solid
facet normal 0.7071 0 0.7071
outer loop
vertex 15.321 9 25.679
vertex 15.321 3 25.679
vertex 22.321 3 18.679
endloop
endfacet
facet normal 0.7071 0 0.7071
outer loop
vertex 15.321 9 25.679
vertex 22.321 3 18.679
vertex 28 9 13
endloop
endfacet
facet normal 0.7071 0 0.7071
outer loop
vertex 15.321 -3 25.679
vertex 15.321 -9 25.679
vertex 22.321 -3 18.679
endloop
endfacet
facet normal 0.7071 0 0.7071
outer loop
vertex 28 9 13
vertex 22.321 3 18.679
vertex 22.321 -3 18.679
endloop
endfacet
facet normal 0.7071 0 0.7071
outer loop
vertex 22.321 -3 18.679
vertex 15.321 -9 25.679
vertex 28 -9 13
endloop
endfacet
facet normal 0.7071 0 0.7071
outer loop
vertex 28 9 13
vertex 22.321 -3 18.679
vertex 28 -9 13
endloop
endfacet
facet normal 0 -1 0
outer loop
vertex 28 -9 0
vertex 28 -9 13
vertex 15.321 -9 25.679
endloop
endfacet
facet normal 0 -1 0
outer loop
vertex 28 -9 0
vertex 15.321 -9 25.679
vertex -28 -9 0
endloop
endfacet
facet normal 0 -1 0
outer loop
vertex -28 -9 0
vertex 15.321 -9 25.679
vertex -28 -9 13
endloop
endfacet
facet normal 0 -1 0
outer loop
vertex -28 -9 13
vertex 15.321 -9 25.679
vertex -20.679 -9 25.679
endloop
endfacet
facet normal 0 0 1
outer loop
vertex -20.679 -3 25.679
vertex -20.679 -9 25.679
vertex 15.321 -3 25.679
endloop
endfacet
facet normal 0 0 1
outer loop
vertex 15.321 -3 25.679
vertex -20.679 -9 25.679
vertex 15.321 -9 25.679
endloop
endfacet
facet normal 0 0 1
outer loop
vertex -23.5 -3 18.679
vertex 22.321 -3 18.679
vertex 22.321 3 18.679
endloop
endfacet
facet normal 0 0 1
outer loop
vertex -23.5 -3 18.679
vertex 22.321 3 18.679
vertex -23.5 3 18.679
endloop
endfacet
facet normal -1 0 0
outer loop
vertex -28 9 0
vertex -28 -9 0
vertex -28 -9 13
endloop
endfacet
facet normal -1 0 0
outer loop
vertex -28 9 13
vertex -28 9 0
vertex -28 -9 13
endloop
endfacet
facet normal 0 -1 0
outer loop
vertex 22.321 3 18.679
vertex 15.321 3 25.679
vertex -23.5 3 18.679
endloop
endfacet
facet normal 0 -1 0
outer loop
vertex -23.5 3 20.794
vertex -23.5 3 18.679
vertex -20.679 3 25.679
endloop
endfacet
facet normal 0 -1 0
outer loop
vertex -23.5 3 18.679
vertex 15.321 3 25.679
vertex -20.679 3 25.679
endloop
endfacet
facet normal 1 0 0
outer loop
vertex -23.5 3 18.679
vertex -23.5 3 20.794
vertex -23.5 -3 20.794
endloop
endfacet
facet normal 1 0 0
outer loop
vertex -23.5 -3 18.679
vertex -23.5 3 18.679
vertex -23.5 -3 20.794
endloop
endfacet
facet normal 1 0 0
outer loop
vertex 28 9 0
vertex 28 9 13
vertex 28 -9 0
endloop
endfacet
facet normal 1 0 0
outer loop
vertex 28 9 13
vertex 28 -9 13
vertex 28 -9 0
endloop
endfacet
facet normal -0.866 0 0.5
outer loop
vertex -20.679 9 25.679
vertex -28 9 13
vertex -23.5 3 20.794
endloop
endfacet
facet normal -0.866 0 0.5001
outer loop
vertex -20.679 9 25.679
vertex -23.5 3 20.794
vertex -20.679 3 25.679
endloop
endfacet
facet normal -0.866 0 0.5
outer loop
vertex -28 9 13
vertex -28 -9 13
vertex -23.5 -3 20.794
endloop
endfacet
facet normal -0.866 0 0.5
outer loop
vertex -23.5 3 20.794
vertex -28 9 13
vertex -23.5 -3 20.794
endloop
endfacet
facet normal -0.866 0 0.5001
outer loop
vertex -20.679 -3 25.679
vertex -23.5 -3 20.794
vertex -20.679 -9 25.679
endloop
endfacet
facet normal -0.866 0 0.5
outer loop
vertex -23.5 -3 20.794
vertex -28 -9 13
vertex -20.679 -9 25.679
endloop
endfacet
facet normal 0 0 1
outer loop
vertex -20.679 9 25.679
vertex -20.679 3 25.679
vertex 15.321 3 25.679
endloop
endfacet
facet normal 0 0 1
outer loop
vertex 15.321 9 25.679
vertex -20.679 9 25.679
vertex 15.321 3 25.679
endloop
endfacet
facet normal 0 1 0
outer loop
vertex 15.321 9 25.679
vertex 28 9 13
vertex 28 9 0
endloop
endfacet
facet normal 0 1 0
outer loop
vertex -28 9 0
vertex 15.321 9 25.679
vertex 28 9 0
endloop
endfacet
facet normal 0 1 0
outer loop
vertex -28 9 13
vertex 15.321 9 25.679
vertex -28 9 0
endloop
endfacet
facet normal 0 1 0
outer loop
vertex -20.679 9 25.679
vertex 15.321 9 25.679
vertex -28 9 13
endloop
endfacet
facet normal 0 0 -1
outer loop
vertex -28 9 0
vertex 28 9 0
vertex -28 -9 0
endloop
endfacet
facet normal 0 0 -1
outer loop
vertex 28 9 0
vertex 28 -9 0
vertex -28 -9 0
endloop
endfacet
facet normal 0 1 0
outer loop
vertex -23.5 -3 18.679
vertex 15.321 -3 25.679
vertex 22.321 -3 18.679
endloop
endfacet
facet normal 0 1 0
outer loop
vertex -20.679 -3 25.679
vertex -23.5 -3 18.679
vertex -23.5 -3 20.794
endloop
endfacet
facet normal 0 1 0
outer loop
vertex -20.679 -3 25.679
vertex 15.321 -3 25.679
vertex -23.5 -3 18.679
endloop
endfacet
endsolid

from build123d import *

# Parameters (mm, degrees)
PAD_DEPTH    = 9
SKETCH001_W  = 47
SKETCH001_H  = 6
POCKET_DEPTH = 7


with BuildPart() as part:
    # Sketch → Pad (new body, symmetric)
    with BuildSketch(Plane.XZ):
        Polygon((-20.679492, 25.679492), (15.320508, 25.679492), (28, 13), (28, 0), (-28, 0), (-28, 13), align=None)
    extrude(amount=PAD_DEPTH, both=True)

    # Sketch001 (on Face1 of Pad) → Pocket (cut)
    with BuildSketch(Plane(origin=(0, 0, 25.679492), x_dir=(-1, 0, 0), z_dir=(0, 0, 1))):
        Rectangle(SKETCH001_W, SKETCH001_H)
    extrude(amount=-POCKET_DEPTH, mode=Mode.SUBTRACT)


solid = part.part
